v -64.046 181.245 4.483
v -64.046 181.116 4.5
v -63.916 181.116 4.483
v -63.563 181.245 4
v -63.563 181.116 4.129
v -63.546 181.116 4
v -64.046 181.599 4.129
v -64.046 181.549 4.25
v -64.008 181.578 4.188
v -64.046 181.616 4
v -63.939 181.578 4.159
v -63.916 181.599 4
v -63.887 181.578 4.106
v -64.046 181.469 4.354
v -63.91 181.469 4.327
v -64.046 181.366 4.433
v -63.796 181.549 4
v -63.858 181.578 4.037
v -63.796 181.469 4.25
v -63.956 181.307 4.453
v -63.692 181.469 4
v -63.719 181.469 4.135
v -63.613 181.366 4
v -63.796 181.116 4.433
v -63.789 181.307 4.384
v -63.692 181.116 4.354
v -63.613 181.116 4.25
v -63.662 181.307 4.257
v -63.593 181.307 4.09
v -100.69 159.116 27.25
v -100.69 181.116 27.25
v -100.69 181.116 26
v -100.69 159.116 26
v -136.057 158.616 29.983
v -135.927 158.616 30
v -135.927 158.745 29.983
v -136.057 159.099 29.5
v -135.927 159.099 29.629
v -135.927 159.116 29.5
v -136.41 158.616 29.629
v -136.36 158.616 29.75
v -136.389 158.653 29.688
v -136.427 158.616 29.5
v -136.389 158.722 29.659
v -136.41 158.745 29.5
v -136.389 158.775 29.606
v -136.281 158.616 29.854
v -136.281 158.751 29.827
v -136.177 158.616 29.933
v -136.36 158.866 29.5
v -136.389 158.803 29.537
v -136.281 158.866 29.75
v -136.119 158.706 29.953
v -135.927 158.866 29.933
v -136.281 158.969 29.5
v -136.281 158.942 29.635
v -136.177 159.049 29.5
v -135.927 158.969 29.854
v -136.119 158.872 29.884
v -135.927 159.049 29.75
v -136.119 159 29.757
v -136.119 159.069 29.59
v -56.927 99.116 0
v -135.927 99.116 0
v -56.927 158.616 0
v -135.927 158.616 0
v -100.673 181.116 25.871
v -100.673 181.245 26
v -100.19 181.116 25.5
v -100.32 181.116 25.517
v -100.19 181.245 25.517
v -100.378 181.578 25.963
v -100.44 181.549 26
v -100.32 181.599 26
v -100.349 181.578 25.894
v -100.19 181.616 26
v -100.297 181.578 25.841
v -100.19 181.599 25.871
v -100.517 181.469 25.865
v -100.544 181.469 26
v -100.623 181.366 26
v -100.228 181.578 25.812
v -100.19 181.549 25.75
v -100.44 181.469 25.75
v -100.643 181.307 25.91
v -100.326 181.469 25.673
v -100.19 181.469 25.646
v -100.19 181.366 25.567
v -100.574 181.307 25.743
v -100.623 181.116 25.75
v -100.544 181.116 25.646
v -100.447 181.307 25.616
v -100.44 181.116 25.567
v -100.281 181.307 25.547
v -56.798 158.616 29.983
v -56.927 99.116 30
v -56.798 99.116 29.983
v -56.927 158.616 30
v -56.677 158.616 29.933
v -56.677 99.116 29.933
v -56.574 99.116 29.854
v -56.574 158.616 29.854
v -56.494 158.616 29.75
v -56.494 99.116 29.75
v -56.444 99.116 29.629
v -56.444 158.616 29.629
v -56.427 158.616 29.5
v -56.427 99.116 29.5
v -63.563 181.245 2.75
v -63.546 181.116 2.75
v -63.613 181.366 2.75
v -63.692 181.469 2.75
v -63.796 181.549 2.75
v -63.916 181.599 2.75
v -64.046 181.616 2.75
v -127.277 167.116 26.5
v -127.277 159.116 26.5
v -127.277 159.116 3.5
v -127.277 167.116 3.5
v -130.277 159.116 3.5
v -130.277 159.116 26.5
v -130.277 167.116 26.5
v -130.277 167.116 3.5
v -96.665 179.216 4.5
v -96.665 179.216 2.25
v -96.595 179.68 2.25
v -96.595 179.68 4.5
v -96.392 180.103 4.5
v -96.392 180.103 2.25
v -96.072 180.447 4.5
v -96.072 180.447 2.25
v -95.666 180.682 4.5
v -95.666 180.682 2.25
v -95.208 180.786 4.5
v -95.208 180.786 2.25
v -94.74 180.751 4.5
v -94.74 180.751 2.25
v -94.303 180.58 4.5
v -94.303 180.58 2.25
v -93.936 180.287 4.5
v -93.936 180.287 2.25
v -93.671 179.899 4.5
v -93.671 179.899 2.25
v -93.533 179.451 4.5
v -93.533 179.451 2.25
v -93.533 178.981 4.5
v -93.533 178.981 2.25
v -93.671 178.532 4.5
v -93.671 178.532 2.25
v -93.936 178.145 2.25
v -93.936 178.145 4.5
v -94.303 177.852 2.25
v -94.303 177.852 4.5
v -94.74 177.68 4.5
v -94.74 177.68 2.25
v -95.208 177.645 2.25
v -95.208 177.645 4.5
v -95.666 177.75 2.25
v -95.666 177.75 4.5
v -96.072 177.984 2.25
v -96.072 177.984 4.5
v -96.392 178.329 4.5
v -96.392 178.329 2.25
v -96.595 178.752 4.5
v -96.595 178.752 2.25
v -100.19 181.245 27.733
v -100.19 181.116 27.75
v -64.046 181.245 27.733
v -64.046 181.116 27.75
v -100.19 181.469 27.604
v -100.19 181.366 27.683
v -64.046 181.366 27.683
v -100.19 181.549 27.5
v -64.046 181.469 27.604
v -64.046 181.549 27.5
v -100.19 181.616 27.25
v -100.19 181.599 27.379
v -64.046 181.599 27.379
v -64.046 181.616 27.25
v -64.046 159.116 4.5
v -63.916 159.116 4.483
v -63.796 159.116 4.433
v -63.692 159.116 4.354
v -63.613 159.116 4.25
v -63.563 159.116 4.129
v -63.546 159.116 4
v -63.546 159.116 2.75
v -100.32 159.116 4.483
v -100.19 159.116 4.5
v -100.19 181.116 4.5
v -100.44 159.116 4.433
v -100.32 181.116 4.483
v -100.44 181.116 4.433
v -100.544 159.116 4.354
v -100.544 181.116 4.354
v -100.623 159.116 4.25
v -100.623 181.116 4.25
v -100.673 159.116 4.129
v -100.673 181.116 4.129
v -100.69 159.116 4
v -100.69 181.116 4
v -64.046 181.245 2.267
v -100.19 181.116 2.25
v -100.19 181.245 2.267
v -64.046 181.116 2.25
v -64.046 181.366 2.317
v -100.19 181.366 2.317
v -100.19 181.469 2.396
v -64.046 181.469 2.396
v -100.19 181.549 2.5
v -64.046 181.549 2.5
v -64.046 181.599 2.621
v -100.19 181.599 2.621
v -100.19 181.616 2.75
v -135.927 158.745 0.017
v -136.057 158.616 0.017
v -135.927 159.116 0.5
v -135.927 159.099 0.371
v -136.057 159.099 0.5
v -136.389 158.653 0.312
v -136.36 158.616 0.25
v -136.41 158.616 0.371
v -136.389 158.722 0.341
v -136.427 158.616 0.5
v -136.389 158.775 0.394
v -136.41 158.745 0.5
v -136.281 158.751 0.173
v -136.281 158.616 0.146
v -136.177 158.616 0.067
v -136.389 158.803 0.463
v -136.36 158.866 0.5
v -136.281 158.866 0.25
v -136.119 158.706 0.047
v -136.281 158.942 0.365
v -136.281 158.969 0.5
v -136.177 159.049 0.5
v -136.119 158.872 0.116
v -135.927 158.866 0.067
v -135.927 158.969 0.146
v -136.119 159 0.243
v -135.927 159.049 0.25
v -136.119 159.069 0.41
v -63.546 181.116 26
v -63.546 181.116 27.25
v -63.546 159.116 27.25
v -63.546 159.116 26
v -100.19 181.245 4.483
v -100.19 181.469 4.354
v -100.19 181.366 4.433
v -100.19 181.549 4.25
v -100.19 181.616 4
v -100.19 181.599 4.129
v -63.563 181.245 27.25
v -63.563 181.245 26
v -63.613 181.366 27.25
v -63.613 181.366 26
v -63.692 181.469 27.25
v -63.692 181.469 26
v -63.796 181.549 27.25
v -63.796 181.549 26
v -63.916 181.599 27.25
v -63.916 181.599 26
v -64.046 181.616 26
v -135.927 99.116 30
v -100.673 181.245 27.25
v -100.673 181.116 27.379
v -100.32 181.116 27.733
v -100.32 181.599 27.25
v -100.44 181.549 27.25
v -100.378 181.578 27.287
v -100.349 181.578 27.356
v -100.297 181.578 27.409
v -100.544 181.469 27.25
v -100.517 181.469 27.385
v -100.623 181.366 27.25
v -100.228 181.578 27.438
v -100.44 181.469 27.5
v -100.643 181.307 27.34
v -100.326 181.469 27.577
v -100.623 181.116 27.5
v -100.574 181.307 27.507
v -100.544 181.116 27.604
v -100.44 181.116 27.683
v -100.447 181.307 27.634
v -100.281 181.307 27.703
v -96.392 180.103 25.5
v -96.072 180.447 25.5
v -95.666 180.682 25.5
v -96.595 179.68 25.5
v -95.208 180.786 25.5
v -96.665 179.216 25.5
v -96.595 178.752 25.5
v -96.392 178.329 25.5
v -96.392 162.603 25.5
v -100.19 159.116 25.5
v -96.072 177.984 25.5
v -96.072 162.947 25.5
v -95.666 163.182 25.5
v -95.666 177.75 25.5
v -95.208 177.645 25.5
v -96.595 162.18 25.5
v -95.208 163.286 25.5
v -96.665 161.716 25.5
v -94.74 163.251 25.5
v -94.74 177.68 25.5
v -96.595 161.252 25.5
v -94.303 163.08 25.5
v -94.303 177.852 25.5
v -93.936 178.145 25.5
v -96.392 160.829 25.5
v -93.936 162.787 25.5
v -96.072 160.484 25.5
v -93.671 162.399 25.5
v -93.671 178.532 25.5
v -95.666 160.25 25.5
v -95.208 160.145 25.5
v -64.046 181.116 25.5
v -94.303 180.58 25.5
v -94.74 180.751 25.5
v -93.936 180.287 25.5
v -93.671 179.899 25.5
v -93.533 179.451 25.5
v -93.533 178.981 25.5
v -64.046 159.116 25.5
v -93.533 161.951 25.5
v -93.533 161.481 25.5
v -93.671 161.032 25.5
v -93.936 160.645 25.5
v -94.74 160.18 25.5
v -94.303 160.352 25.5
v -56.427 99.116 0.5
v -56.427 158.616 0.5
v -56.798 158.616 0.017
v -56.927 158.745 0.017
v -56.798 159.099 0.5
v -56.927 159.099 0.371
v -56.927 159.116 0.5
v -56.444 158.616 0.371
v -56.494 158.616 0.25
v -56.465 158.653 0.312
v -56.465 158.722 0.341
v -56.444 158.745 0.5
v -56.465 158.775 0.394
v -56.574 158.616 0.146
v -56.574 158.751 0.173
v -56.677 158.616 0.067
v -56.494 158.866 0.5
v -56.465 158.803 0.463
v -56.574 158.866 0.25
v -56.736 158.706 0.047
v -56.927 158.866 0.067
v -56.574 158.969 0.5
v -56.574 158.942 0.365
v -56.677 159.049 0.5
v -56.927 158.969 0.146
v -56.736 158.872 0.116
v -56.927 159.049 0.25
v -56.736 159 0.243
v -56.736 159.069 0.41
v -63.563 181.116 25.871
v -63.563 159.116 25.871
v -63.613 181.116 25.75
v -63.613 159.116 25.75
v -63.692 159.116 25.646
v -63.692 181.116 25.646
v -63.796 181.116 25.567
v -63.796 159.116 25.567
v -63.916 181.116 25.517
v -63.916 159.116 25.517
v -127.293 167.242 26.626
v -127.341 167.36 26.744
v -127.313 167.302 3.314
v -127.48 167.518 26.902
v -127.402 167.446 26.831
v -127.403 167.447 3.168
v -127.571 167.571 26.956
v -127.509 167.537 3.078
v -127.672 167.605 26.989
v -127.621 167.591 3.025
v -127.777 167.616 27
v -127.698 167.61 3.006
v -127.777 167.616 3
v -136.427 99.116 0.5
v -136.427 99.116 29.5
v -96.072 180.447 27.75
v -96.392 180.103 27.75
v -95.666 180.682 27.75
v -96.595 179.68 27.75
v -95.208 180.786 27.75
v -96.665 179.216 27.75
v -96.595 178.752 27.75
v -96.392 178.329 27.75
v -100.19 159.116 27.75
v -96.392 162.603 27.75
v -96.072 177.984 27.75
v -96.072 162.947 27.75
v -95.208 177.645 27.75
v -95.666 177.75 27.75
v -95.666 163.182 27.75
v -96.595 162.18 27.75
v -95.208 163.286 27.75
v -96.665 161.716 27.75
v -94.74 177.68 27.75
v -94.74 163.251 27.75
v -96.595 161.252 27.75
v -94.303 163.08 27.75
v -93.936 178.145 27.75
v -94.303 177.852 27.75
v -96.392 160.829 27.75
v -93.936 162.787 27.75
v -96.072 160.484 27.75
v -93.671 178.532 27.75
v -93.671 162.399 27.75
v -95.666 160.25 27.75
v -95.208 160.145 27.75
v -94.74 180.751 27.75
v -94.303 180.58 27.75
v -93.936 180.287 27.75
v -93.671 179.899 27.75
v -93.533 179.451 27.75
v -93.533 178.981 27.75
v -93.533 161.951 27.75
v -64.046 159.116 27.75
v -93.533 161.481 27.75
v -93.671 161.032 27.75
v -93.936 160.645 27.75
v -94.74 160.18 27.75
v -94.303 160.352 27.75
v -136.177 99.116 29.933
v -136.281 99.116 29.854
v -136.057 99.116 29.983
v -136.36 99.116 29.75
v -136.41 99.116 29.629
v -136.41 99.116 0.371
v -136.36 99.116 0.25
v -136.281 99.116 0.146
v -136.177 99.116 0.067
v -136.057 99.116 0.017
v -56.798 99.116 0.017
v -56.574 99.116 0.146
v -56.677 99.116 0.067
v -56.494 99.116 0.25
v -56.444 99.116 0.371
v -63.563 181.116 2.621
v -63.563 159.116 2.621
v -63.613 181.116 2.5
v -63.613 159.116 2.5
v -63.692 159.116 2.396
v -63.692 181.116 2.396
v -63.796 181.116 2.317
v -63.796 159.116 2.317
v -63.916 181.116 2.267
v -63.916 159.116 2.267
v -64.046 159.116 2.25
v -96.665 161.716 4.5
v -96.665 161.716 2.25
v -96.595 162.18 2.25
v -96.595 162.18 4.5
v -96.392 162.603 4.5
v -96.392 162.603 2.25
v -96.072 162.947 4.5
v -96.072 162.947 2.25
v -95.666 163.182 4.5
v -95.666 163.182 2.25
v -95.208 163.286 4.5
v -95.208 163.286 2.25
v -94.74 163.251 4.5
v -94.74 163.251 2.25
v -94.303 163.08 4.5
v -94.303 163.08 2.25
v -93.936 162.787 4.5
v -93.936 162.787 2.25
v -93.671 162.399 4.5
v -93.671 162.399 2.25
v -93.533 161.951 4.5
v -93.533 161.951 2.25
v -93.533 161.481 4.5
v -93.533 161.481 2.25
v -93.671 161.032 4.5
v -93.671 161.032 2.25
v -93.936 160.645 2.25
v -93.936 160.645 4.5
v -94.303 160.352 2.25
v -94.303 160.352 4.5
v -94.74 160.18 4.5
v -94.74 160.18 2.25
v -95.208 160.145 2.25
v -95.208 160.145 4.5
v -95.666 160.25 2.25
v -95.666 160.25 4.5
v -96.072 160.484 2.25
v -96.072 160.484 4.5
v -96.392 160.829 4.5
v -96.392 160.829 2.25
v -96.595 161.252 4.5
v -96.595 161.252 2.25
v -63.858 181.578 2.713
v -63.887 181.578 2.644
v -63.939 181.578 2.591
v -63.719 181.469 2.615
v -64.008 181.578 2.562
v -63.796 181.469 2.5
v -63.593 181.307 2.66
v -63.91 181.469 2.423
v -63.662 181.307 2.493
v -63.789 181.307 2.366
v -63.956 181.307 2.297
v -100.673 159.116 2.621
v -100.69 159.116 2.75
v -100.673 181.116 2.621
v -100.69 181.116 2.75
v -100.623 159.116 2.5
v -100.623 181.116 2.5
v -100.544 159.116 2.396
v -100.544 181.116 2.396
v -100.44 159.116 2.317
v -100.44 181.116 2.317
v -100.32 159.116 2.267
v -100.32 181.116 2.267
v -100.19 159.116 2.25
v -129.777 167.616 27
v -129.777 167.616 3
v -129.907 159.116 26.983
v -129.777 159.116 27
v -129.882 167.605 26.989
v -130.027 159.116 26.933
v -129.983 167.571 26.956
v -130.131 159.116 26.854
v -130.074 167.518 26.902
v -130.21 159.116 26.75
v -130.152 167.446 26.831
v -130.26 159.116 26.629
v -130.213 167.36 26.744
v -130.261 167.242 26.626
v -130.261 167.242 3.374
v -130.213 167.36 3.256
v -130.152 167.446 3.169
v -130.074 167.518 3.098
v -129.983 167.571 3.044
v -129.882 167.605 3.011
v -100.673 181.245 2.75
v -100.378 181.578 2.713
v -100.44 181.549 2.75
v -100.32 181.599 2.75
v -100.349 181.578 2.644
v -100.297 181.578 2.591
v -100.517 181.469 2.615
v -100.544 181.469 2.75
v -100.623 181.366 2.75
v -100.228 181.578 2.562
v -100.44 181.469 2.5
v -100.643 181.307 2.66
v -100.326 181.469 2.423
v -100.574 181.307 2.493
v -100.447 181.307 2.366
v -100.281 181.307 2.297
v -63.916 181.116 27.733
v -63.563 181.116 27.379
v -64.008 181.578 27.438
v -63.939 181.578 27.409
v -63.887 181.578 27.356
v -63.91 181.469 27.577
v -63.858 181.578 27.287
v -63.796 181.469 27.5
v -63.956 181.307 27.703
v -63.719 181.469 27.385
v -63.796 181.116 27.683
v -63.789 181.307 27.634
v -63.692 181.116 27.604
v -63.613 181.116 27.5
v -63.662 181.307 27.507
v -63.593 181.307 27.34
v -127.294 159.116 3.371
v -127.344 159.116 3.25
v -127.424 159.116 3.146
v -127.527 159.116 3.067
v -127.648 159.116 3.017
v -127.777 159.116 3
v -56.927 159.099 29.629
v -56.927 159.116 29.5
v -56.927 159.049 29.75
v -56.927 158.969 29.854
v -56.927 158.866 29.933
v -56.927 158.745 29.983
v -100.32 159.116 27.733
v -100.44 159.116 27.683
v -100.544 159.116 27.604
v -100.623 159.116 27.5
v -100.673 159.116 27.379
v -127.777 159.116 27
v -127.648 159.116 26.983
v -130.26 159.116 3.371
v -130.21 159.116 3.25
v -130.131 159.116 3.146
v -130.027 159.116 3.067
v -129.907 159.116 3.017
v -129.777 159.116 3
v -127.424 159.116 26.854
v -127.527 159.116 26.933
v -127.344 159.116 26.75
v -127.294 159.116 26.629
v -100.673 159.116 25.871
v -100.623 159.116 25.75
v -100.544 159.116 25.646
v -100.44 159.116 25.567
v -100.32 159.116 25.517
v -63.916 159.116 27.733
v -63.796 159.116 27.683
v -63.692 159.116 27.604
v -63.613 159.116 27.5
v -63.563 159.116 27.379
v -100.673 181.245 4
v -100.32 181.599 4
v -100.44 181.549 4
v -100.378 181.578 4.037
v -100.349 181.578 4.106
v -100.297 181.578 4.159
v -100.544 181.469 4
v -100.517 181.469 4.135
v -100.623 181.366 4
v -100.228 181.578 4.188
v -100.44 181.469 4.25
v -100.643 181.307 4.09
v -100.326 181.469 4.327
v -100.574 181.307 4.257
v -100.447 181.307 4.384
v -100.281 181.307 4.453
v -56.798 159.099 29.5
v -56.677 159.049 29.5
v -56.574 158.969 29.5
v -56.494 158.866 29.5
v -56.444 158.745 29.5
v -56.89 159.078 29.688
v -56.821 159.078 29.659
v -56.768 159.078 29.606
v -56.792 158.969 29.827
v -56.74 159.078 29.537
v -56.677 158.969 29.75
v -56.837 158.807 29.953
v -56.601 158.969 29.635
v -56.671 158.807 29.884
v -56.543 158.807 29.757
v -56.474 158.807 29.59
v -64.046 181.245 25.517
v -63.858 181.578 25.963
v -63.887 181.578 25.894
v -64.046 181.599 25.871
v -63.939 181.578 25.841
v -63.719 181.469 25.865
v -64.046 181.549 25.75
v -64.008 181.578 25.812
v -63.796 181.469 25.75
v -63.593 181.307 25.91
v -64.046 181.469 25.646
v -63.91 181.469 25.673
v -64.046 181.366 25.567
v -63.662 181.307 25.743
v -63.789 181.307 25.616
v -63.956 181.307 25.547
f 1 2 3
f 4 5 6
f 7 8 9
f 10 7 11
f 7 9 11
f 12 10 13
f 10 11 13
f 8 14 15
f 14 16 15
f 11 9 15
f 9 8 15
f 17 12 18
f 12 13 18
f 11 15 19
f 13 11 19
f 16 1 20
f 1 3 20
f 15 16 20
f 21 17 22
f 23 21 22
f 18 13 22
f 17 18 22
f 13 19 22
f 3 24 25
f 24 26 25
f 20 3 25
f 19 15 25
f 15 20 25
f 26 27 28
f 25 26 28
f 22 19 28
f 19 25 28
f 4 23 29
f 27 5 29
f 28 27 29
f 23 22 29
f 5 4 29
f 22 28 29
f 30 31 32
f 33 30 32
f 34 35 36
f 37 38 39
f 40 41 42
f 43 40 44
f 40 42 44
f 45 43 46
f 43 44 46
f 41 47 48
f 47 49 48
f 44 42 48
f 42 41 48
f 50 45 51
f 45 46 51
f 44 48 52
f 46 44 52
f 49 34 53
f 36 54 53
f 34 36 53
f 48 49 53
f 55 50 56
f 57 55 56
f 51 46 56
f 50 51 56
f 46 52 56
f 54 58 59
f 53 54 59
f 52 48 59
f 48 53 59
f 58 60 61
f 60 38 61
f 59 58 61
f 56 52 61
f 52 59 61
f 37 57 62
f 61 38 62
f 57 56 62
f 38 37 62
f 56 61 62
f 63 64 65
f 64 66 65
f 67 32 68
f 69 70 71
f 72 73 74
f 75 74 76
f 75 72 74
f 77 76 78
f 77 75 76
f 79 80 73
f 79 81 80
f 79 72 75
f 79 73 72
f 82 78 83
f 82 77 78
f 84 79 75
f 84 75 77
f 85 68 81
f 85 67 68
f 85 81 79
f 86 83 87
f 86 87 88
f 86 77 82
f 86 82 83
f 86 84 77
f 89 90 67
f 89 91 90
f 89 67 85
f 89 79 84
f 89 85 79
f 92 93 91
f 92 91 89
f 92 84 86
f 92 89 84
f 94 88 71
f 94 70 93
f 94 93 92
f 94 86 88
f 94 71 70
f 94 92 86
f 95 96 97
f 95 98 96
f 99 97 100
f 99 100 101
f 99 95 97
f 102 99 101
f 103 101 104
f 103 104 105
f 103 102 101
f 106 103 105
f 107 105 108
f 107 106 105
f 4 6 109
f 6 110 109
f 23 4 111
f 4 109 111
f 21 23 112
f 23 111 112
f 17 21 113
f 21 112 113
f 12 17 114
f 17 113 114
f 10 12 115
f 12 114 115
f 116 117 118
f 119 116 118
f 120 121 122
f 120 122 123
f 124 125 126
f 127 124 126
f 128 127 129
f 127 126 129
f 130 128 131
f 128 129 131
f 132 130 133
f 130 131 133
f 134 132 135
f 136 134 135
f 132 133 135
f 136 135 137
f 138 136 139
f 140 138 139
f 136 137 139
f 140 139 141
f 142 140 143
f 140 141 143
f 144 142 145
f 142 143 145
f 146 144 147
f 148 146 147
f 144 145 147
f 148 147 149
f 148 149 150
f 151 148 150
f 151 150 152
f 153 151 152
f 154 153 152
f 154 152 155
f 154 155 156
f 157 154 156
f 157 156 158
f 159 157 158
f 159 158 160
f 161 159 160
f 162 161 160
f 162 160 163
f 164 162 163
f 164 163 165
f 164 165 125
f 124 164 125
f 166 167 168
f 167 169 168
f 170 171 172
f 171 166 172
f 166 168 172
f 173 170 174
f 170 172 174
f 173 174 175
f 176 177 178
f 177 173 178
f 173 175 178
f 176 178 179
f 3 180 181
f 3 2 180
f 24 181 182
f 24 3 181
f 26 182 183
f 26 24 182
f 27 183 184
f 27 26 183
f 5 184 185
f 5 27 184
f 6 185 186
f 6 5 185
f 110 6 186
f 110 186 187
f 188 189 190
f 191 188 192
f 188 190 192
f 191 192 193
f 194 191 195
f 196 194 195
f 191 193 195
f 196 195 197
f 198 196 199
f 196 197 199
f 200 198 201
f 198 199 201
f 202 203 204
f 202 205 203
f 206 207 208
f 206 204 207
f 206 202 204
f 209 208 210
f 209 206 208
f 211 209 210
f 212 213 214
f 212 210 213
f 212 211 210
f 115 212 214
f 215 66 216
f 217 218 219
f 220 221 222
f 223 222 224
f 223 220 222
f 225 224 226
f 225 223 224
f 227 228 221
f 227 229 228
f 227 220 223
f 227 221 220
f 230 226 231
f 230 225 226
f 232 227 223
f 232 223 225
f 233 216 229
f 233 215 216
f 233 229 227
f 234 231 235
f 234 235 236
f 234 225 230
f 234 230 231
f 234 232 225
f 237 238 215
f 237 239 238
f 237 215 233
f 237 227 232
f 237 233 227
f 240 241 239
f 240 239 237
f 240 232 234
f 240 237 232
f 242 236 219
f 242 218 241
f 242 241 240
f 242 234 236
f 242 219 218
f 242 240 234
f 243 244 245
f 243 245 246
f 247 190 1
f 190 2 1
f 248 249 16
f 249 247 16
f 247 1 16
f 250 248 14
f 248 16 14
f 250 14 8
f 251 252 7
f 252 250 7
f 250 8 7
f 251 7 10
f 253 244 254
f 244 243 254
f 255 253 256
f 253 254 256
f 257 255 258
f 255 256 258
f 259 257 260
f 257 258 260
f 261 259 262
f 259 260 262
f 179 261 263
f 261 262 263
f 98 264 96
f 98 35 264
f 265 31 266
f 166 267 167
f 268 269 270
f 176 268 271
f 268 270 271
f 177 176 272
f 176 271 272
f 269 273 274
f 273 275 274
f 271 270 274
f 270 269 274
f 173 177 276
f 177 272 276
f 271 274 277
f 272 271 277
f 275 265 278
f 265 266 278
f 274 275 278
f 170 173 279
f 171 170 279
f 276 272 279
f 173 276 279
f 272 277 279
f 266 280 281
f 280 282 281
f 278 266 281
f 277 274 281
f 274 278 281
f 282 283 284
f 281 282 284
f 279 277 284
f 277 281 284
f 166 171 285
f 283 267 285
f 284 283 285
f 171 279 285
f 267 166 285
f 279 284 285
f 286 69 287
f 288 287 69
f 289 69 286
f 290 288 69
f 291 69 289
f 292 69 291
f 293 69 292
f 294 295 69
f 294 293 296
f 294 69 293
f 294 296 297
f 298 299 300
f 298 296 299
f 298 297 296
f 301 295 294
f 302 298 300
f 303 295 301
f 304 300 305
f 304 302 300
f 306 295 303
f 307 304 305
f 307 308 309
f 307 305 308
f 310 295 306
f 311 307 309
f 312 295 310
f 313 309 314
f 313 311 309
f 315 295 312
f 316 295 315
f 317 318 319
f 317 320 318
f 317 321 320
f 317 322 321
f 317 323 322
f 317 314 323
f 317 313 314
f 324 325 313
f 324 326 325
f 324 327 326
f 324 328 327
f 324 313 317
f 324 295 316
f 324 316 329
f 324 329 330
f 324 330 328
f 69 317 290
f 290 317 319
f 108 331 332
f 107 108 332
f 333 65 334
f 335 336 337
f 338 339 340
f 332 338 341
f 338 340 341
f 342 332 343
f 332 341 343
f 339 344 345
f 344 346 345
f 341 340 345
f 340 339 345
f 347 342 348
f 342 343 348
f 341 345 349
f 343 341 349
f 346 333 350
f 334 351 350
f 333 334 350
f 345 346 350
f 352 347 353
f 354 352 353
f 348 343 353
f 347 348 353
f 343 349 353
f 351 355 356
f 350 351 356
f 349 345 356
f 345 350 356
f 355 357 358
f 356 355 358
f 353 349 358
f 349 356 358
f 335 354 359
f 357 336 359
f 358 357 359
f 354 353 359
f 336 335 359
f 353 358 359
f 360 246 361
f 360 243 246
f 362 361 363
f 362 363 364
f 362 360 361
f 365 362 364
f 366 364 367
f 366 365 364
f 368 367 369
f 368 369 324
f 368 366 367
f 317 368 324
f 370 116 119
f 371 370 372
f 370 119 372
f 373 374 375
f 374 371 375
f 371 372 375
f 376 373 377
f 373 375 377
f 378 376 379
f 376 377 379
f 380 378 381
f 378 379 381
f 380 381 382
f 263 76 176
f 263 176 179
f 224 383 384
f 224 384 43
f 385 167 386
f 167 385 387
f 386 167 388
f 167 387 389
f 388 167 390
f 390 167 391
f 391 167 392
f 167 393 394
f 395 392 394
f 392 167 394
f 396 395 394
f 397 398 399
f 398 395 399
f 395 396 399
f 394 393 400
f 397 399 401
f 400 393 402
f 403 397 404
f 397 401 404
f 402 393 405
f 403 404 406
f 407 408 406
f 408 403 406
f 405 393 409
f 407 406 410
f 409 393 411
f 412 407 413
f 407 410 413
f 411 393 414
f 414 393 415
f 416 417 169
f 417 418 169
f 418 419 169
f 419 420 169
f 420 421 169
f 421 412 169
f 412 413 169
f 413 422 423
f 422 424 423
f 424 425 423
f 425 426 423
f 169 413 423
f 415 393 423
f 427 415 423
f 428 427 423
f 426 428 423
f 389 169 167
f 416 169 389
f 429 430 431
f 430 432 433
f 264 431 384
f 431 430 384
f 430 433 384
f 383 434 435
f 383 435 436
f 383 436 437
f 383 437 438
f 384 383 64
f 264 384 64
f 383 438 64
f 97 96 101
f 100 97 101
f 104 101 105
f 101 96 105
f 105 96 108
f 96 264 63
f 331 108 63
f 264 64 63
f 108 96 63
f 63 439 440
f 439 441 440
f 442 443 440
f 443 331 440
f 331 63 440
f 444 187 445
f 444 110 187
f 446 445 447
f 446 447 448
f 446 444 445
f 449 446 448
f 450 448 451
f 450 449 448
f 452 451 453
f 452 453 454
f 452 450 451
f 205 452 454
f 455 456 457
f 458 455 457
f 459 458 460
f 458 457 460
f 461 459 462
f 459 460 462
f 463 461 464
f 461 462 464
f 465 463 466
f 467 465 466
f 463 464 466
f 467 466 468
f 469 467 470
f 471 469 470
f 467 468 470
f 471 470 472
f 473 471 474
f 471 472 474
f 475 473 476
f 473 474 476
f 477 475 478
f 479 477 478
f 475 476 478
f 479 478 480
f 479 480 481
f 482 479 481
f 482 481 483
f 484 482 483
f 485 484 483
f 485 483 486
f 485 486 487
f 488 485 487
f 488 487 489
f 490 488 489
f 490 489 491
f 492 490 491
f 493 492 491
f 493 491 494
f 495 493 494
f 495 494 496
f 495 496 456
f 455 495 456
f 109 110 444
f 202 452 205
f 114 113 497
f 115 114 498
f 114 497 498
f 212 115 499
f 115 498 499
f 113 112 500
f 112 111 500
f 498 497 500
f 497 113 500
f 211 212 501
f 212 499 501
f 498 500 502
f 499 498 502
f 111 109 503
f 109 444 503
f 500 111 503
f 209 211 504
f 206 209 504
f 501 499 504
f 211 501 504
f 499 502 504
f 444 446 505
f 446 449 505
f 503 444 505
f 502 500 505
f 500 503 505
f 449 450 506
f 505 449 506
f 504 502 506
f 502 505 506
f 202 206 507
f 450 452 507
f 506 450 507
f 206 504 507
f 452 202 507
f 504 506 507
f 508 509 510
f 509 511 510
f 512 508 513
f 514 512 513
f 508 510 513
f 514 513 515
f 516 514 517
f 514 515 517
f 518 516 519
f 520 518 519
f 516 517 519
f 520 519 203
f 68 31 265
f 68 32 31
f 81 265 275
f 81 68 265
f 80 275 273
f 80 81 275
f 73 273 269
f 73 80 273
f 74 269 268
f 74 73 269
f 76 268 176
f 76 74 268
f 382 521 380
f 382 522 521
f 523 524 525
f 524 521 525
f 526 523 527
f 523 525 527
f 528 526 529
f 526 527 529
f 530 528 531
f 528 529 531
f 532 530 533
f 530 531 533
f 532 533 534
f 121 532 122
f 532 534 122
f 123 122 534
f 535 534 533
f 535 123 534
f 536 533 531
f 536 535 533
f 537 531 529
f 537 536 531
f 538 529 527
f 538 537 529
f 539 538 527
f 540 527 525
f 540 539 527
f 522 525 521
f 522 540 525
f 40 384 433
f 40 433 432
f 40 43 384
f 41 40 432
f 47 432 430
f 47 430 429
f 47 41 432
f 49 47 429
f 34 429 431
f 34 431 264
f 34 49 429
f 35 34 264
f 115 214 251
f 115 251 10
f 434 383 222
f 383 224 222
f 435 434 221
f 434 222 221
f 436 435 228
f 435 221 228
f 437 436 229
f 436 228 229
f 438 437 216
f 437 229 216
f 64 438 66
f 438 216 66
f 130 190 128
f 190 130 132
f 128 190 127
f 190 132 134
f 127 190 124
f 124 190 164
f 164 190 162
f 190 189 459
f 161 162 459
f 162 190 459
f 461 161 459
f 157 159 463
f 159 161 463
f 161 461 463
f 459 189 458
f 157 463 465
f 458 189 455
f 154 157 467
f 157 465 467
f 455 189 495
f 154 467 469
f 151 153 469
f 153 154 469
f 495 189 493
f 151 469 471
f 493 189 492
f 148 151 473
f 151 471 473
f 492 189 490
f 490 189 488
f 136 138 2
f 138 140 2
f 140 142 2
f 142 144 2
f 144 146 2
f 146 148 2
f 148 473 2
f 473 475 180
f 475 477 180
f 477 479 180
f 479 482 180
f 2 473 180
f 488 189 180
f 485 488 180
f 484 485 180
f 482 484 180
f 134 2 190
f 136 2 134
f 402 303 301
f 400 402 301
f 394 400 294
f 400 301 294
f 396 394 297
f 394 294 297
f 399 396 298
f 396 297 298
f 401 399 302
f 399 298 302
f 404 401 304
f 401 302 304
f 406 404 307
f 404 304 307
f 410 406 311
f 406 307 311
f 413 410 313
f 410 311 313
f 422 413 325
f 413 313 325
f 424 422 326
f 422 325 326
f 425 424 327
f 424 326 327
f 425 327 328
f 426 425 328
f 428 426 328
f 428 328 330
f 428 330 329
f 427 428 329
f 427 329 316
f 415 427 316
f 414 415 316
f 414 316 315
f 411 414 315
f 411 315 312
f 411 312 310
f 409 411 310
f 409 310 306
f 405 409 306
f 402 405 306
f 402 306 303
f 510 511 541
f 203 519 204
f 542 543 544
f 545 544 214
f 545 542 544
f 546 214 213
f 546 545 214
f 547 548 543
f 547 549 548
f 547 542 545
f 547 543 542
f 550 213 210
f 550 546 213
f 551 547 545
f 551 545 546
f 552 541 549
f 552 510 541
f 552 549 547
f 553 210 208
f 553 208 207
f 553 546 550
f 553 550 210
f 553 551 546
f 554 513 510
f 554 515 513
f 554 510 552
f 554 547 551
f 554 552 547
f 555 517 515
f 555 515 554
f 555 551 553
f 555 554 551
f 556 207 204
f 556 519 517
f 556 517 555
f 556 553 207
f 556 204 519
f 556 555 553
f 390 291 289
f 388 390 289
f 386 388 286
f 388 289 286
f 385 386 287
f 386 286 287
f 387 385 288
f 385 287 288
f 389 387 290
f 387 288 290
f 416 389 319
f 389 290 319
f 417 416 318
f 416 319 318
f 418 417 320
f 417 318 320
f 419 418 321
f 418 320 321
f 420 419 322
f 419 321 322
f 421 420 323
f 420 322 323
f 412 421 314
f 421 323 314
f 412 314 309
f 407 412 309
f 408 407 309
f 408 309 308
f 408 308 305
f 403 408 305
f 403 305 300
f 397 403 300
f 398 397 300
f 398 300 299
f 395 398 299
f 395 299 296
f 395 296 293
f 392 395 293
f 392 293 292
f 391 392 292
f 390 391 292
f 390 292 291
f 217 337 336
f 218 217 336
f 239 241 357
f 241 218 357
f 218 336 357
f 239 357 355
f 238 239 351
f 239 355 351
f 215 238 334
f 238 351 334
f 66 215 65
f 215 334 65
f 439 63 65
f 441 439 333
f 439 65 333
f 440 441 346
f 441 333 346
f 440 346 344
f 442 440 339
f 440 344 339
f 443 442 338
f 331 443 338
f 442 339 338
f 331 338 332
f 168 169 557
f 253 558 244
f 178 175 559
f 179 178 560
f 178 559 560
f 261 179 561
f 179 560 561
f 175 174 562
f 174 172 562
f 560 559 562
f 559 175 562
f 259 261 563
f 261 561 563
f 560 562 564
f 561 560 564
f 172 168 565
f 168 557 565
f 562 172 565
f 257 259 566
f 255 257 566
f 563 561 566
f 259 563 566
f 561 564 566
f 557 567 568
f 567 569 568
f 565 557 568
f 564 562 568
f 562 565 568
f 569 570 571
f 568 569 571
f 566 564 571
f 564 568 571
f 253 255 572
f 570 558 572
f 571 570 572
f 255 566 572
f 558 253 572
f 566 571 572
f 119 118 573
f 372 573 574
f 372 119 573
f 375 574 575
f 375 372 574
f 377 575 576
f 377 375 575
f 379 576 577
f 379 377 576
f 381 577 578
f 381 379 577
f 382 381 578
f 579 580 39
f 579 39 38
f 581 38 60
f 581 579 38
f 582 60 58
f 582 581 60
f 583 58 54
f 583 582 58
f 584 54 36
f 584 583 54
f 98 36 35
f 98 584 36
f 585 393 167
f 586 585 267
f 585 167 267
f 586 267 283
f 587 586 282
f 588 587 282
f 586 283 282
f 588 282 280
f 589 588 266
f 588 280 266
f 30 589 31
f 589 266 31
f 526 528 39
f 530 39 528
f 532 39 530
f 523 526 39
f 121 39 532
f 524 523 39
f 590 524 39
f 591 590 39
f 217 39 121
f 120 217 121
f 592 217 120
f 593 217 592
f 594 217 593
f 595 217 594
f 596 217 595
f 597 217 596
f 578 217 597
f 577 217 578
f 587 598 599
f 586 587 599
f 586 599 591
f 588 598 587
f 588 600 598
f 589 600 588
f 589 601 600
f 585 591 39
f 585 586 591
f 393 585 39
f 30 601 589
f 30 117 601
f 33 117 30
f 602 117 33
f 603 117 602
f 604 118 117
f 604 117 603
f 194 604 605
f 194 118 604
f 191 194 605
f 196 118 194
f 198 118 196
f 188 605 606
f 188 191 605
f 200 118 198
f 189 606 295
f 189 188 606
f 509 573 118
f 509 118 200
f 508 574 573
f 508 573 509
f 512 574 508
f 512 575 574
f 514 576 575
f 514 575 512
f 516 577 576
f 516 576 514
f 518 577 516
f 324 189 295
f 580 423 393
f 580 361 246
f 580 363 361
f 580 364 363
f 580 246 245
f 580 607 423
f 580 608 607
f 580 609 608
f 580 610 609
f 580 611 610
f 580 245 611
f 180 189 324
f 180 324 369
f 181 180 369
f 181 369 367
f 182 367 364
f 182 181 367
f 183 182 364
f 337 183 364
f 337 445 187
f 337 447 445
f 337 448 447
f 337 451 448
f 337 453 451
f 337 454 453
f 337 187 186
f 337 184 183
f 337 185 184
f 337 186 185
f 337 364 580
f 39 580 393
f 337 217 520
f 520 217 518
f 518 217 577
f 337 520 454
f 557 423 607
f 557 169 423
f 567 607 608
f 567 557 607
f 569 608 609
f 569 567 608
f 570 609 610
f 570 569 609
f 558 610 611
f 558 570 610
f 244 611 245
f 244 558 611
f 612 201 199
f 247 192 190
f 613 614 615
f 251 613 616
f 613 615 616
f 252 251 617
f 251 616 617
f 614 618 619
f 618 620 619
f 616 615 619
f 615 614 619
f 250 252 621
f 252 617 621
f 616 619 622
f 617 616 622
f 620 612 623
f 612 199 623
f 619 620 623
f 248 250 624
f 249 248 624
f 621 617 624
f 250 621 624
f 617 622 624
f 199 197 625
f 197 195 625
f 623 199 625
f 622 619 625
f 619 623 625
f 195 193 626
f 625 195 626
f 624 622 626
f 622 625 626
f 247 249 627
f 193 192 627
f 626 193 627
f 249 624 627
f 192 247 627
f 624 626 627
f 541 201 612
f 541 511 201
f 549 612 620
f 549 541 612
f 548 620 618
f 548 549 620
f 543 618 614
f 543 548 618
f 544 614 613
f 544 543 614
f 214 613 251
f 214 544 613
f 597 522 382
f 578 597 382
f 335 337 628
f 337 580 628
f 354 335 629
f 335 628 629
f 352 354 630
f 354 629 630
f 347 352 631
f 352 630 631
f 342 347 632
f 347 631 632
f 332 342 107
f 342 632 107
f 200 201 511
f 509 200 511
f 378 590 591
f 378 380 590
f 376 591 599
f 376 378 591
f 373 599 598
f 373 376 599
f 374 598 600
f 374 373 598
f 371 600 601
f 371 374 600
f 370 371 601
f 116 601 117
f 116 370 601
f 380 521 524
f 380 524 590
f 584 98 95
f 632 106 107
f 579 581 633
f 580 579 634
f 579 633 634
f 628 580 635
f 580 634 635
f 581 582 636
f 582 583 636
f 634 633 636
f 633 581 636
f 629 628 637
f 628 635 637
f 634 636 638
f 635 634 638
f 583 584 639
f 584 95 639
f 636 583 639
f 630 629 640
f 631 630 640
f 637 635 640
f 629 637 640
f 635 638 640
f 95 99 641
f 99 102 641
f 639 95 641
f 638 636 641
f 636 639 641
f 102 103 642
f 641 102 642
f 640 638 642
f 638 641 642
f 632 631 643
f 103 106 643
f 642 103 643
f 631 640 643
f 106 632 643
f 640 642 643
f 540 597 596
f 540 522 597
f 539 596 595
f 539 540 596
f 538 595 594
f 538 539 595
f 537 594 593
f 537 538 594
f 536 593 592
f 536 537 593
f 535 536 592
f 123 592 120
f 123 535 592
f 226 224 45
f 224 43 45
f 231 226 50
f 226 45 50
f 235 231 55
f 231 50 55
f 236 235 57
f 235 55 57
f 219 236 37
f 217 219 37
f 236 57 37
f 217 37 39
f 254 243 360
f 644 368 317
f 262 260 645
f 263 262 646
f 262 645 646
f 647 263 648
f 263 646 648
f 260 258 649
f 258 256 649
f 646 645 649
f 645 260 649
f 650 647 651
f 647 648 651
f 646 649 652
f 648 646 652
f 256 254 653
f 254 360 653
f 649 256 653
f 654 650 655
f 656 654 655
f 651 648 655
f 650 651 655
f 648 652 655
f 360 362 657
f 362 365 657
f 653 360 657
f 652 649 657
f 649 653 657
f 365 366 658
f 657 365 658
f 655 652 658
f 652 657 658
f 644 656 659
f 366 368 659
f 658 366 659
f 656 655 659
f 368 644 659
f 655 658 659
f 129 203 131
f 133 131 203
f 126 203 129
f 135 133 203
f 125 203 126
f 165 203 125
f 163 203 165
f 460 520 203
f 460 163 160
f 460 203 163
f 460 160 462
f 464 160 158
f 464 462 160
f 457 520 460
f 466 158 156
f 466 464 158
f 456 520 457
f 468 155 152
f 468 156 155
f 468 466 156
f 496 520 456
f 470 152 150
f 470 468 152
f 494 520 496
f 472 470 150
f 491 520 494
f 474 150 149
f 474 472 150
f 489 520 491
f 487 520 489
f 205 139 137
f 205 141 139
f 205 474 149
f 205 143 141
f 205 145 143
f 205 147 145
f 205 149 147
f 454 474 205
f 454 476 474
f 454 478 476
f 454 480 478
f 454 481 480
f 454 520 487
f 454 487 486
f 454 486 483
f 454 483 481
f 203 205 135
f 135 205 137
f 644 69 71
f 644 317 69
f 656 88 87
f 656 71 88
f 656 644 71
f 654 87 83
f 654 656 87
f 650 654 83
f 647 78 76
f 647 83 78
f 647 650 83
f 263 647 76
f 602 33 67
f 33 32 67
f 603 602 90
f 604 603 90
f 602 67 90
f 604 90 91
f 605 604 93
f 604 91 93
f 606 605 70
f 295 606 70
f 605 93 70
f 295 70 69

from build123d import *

# Parameters (mm, degrees)
SKETCH1_W           = 80
SKETCH1_H           = 60
BOSS_EXTRUDE1_DEPTH = 30
SKETCH2_W           = 37.144630664
SKETCH2_H           = 2.25
BOSS_EXTRUDE2_DEPTH = 22.5
SKETCH3_W           = 3
SKETCH3_H           = 24
BOSS_EXTRUDE3_DEPTH = 8.5
SKETCH5_R           = 1.575
CUT_EXTRUDE1_DEPTH  = 30
FILLET2_R           = 0.5


with BuildPart() as part:
    # Sketch1 → Boss-Extrude1 (new body)
    with BuildSketch(Plane.XY):
        with Locations((-96.427201848, 129.115774072)):
            Rectangle(SKETCH1_W, SKETCH1_H)
    extrude(amount=BOSS_EXTRUDE1_DEPTH)

    # Sketch2 → Boss-Extrude2 (add)
    with BuildSketch(Plane(origin=(0, 159.115774072, 0), x_dir=(1, 0, 0), z_dir=(0, 1, 0))):
        with Locations((-82.11807708, -3.375)):
            Rectangle(SKETCH2_W, SKETCH2_H)
        with Locations((-82.11807708, -26.625)):
            Rectangle(SKETCH2_W, SKETCH2_H)
    extrude(amount=BOSS_EXTRUDE2_DEPTH)

    # Sketch3 → Boss-Extrude3 (add)
    with BuildSketch(Plane(origin=(0, 159.115774072, 0), x_dir=(1, 0, 0), z_dir=(0, 1, 0))):
        with Locations((-128.777201848, -15)):
            Rectangle(SKETCH3_W, SKETCH3_H)
    extrude(amount=BOSS_EXTRUDE3_DEPTH)

    # Sketch5 → Cut-Extrude1 (cut)
    with BuildSketch(Plane(origin=(0, 0, 2.25), x_dir=(-1, 0, 0), z_dir=(0, 0, -1))):
        with Locations((95.090392412, 161.715774072)):
            Circle(SKETCH5_R)
        with Locations((95.090392412, 179.215774072)):
            Circle(SKETCH5_R)
    extrude(amount=-CUT_EXTRUDE1_DEPTH, mode=Mode.SUBTRACT)

    # Fillet2
    fillet2_edges = [part.edges().sort_by_distance(p)[0] for p in [
        (-56.427201848, 129.115774072, 30),
        (-100.690392412, 170.365774072, 2.25),
        (-100.690392412, 170.365774072, 4.5),
        (-96.427201848, 159.115774072, 30),
        (-63.545761748, 170.365774072, 4.5),
        (-63.545761748, 170.365774072, 2.25),
        (-100.690392412, 181.615774072, 3.375),
        (-82.11807708, 181.615774072, 4.5),
        (-63.545761748, 181.615774072, 3.375),
        (-82.11807708, 181.615774072, 2.25),
        (-100.690392412, 170.365774072, 25.5),
        (-100.690392412, 170.365774072, 27.75),
        (-63.545761748, 170.365774072, 27.75),
        (-63.545761748, 170.365774072, 25.5),
        (-100.690392412, 181.615774072, 26.625),
        (-82.11807708, 181.615774072, 27.75),
        (-63.545761748, 181.615774072, 26.625),
        (-82.11807708, 181.615774072, 25.5),
        (-130.277201848, 163.365774072, 3),
        (-130.277201848, 163.365774072, 27),
        (-127.277201848, 163.365774072, 27),
        (-127.277201848, 163.365774072, 3),
        (-130.277201848, 167.615774072, 15),
        (-127.277201848, 167.615774072, 15),
        (-136.427201848, 129.115774072, 30),
        (-96.427201848, 159.115774072, 0),
        (-56.427201848, 129.115774072, 0),
        (-136.427201848, 129.115774072, 0),
        (-136.427201848, 159.115774072, 15),
        (-56.427201848, 159.115774072, 15),
    ]]
    fillet(fillet2_edges, radius=FILLET2_R)


solid = part.part
